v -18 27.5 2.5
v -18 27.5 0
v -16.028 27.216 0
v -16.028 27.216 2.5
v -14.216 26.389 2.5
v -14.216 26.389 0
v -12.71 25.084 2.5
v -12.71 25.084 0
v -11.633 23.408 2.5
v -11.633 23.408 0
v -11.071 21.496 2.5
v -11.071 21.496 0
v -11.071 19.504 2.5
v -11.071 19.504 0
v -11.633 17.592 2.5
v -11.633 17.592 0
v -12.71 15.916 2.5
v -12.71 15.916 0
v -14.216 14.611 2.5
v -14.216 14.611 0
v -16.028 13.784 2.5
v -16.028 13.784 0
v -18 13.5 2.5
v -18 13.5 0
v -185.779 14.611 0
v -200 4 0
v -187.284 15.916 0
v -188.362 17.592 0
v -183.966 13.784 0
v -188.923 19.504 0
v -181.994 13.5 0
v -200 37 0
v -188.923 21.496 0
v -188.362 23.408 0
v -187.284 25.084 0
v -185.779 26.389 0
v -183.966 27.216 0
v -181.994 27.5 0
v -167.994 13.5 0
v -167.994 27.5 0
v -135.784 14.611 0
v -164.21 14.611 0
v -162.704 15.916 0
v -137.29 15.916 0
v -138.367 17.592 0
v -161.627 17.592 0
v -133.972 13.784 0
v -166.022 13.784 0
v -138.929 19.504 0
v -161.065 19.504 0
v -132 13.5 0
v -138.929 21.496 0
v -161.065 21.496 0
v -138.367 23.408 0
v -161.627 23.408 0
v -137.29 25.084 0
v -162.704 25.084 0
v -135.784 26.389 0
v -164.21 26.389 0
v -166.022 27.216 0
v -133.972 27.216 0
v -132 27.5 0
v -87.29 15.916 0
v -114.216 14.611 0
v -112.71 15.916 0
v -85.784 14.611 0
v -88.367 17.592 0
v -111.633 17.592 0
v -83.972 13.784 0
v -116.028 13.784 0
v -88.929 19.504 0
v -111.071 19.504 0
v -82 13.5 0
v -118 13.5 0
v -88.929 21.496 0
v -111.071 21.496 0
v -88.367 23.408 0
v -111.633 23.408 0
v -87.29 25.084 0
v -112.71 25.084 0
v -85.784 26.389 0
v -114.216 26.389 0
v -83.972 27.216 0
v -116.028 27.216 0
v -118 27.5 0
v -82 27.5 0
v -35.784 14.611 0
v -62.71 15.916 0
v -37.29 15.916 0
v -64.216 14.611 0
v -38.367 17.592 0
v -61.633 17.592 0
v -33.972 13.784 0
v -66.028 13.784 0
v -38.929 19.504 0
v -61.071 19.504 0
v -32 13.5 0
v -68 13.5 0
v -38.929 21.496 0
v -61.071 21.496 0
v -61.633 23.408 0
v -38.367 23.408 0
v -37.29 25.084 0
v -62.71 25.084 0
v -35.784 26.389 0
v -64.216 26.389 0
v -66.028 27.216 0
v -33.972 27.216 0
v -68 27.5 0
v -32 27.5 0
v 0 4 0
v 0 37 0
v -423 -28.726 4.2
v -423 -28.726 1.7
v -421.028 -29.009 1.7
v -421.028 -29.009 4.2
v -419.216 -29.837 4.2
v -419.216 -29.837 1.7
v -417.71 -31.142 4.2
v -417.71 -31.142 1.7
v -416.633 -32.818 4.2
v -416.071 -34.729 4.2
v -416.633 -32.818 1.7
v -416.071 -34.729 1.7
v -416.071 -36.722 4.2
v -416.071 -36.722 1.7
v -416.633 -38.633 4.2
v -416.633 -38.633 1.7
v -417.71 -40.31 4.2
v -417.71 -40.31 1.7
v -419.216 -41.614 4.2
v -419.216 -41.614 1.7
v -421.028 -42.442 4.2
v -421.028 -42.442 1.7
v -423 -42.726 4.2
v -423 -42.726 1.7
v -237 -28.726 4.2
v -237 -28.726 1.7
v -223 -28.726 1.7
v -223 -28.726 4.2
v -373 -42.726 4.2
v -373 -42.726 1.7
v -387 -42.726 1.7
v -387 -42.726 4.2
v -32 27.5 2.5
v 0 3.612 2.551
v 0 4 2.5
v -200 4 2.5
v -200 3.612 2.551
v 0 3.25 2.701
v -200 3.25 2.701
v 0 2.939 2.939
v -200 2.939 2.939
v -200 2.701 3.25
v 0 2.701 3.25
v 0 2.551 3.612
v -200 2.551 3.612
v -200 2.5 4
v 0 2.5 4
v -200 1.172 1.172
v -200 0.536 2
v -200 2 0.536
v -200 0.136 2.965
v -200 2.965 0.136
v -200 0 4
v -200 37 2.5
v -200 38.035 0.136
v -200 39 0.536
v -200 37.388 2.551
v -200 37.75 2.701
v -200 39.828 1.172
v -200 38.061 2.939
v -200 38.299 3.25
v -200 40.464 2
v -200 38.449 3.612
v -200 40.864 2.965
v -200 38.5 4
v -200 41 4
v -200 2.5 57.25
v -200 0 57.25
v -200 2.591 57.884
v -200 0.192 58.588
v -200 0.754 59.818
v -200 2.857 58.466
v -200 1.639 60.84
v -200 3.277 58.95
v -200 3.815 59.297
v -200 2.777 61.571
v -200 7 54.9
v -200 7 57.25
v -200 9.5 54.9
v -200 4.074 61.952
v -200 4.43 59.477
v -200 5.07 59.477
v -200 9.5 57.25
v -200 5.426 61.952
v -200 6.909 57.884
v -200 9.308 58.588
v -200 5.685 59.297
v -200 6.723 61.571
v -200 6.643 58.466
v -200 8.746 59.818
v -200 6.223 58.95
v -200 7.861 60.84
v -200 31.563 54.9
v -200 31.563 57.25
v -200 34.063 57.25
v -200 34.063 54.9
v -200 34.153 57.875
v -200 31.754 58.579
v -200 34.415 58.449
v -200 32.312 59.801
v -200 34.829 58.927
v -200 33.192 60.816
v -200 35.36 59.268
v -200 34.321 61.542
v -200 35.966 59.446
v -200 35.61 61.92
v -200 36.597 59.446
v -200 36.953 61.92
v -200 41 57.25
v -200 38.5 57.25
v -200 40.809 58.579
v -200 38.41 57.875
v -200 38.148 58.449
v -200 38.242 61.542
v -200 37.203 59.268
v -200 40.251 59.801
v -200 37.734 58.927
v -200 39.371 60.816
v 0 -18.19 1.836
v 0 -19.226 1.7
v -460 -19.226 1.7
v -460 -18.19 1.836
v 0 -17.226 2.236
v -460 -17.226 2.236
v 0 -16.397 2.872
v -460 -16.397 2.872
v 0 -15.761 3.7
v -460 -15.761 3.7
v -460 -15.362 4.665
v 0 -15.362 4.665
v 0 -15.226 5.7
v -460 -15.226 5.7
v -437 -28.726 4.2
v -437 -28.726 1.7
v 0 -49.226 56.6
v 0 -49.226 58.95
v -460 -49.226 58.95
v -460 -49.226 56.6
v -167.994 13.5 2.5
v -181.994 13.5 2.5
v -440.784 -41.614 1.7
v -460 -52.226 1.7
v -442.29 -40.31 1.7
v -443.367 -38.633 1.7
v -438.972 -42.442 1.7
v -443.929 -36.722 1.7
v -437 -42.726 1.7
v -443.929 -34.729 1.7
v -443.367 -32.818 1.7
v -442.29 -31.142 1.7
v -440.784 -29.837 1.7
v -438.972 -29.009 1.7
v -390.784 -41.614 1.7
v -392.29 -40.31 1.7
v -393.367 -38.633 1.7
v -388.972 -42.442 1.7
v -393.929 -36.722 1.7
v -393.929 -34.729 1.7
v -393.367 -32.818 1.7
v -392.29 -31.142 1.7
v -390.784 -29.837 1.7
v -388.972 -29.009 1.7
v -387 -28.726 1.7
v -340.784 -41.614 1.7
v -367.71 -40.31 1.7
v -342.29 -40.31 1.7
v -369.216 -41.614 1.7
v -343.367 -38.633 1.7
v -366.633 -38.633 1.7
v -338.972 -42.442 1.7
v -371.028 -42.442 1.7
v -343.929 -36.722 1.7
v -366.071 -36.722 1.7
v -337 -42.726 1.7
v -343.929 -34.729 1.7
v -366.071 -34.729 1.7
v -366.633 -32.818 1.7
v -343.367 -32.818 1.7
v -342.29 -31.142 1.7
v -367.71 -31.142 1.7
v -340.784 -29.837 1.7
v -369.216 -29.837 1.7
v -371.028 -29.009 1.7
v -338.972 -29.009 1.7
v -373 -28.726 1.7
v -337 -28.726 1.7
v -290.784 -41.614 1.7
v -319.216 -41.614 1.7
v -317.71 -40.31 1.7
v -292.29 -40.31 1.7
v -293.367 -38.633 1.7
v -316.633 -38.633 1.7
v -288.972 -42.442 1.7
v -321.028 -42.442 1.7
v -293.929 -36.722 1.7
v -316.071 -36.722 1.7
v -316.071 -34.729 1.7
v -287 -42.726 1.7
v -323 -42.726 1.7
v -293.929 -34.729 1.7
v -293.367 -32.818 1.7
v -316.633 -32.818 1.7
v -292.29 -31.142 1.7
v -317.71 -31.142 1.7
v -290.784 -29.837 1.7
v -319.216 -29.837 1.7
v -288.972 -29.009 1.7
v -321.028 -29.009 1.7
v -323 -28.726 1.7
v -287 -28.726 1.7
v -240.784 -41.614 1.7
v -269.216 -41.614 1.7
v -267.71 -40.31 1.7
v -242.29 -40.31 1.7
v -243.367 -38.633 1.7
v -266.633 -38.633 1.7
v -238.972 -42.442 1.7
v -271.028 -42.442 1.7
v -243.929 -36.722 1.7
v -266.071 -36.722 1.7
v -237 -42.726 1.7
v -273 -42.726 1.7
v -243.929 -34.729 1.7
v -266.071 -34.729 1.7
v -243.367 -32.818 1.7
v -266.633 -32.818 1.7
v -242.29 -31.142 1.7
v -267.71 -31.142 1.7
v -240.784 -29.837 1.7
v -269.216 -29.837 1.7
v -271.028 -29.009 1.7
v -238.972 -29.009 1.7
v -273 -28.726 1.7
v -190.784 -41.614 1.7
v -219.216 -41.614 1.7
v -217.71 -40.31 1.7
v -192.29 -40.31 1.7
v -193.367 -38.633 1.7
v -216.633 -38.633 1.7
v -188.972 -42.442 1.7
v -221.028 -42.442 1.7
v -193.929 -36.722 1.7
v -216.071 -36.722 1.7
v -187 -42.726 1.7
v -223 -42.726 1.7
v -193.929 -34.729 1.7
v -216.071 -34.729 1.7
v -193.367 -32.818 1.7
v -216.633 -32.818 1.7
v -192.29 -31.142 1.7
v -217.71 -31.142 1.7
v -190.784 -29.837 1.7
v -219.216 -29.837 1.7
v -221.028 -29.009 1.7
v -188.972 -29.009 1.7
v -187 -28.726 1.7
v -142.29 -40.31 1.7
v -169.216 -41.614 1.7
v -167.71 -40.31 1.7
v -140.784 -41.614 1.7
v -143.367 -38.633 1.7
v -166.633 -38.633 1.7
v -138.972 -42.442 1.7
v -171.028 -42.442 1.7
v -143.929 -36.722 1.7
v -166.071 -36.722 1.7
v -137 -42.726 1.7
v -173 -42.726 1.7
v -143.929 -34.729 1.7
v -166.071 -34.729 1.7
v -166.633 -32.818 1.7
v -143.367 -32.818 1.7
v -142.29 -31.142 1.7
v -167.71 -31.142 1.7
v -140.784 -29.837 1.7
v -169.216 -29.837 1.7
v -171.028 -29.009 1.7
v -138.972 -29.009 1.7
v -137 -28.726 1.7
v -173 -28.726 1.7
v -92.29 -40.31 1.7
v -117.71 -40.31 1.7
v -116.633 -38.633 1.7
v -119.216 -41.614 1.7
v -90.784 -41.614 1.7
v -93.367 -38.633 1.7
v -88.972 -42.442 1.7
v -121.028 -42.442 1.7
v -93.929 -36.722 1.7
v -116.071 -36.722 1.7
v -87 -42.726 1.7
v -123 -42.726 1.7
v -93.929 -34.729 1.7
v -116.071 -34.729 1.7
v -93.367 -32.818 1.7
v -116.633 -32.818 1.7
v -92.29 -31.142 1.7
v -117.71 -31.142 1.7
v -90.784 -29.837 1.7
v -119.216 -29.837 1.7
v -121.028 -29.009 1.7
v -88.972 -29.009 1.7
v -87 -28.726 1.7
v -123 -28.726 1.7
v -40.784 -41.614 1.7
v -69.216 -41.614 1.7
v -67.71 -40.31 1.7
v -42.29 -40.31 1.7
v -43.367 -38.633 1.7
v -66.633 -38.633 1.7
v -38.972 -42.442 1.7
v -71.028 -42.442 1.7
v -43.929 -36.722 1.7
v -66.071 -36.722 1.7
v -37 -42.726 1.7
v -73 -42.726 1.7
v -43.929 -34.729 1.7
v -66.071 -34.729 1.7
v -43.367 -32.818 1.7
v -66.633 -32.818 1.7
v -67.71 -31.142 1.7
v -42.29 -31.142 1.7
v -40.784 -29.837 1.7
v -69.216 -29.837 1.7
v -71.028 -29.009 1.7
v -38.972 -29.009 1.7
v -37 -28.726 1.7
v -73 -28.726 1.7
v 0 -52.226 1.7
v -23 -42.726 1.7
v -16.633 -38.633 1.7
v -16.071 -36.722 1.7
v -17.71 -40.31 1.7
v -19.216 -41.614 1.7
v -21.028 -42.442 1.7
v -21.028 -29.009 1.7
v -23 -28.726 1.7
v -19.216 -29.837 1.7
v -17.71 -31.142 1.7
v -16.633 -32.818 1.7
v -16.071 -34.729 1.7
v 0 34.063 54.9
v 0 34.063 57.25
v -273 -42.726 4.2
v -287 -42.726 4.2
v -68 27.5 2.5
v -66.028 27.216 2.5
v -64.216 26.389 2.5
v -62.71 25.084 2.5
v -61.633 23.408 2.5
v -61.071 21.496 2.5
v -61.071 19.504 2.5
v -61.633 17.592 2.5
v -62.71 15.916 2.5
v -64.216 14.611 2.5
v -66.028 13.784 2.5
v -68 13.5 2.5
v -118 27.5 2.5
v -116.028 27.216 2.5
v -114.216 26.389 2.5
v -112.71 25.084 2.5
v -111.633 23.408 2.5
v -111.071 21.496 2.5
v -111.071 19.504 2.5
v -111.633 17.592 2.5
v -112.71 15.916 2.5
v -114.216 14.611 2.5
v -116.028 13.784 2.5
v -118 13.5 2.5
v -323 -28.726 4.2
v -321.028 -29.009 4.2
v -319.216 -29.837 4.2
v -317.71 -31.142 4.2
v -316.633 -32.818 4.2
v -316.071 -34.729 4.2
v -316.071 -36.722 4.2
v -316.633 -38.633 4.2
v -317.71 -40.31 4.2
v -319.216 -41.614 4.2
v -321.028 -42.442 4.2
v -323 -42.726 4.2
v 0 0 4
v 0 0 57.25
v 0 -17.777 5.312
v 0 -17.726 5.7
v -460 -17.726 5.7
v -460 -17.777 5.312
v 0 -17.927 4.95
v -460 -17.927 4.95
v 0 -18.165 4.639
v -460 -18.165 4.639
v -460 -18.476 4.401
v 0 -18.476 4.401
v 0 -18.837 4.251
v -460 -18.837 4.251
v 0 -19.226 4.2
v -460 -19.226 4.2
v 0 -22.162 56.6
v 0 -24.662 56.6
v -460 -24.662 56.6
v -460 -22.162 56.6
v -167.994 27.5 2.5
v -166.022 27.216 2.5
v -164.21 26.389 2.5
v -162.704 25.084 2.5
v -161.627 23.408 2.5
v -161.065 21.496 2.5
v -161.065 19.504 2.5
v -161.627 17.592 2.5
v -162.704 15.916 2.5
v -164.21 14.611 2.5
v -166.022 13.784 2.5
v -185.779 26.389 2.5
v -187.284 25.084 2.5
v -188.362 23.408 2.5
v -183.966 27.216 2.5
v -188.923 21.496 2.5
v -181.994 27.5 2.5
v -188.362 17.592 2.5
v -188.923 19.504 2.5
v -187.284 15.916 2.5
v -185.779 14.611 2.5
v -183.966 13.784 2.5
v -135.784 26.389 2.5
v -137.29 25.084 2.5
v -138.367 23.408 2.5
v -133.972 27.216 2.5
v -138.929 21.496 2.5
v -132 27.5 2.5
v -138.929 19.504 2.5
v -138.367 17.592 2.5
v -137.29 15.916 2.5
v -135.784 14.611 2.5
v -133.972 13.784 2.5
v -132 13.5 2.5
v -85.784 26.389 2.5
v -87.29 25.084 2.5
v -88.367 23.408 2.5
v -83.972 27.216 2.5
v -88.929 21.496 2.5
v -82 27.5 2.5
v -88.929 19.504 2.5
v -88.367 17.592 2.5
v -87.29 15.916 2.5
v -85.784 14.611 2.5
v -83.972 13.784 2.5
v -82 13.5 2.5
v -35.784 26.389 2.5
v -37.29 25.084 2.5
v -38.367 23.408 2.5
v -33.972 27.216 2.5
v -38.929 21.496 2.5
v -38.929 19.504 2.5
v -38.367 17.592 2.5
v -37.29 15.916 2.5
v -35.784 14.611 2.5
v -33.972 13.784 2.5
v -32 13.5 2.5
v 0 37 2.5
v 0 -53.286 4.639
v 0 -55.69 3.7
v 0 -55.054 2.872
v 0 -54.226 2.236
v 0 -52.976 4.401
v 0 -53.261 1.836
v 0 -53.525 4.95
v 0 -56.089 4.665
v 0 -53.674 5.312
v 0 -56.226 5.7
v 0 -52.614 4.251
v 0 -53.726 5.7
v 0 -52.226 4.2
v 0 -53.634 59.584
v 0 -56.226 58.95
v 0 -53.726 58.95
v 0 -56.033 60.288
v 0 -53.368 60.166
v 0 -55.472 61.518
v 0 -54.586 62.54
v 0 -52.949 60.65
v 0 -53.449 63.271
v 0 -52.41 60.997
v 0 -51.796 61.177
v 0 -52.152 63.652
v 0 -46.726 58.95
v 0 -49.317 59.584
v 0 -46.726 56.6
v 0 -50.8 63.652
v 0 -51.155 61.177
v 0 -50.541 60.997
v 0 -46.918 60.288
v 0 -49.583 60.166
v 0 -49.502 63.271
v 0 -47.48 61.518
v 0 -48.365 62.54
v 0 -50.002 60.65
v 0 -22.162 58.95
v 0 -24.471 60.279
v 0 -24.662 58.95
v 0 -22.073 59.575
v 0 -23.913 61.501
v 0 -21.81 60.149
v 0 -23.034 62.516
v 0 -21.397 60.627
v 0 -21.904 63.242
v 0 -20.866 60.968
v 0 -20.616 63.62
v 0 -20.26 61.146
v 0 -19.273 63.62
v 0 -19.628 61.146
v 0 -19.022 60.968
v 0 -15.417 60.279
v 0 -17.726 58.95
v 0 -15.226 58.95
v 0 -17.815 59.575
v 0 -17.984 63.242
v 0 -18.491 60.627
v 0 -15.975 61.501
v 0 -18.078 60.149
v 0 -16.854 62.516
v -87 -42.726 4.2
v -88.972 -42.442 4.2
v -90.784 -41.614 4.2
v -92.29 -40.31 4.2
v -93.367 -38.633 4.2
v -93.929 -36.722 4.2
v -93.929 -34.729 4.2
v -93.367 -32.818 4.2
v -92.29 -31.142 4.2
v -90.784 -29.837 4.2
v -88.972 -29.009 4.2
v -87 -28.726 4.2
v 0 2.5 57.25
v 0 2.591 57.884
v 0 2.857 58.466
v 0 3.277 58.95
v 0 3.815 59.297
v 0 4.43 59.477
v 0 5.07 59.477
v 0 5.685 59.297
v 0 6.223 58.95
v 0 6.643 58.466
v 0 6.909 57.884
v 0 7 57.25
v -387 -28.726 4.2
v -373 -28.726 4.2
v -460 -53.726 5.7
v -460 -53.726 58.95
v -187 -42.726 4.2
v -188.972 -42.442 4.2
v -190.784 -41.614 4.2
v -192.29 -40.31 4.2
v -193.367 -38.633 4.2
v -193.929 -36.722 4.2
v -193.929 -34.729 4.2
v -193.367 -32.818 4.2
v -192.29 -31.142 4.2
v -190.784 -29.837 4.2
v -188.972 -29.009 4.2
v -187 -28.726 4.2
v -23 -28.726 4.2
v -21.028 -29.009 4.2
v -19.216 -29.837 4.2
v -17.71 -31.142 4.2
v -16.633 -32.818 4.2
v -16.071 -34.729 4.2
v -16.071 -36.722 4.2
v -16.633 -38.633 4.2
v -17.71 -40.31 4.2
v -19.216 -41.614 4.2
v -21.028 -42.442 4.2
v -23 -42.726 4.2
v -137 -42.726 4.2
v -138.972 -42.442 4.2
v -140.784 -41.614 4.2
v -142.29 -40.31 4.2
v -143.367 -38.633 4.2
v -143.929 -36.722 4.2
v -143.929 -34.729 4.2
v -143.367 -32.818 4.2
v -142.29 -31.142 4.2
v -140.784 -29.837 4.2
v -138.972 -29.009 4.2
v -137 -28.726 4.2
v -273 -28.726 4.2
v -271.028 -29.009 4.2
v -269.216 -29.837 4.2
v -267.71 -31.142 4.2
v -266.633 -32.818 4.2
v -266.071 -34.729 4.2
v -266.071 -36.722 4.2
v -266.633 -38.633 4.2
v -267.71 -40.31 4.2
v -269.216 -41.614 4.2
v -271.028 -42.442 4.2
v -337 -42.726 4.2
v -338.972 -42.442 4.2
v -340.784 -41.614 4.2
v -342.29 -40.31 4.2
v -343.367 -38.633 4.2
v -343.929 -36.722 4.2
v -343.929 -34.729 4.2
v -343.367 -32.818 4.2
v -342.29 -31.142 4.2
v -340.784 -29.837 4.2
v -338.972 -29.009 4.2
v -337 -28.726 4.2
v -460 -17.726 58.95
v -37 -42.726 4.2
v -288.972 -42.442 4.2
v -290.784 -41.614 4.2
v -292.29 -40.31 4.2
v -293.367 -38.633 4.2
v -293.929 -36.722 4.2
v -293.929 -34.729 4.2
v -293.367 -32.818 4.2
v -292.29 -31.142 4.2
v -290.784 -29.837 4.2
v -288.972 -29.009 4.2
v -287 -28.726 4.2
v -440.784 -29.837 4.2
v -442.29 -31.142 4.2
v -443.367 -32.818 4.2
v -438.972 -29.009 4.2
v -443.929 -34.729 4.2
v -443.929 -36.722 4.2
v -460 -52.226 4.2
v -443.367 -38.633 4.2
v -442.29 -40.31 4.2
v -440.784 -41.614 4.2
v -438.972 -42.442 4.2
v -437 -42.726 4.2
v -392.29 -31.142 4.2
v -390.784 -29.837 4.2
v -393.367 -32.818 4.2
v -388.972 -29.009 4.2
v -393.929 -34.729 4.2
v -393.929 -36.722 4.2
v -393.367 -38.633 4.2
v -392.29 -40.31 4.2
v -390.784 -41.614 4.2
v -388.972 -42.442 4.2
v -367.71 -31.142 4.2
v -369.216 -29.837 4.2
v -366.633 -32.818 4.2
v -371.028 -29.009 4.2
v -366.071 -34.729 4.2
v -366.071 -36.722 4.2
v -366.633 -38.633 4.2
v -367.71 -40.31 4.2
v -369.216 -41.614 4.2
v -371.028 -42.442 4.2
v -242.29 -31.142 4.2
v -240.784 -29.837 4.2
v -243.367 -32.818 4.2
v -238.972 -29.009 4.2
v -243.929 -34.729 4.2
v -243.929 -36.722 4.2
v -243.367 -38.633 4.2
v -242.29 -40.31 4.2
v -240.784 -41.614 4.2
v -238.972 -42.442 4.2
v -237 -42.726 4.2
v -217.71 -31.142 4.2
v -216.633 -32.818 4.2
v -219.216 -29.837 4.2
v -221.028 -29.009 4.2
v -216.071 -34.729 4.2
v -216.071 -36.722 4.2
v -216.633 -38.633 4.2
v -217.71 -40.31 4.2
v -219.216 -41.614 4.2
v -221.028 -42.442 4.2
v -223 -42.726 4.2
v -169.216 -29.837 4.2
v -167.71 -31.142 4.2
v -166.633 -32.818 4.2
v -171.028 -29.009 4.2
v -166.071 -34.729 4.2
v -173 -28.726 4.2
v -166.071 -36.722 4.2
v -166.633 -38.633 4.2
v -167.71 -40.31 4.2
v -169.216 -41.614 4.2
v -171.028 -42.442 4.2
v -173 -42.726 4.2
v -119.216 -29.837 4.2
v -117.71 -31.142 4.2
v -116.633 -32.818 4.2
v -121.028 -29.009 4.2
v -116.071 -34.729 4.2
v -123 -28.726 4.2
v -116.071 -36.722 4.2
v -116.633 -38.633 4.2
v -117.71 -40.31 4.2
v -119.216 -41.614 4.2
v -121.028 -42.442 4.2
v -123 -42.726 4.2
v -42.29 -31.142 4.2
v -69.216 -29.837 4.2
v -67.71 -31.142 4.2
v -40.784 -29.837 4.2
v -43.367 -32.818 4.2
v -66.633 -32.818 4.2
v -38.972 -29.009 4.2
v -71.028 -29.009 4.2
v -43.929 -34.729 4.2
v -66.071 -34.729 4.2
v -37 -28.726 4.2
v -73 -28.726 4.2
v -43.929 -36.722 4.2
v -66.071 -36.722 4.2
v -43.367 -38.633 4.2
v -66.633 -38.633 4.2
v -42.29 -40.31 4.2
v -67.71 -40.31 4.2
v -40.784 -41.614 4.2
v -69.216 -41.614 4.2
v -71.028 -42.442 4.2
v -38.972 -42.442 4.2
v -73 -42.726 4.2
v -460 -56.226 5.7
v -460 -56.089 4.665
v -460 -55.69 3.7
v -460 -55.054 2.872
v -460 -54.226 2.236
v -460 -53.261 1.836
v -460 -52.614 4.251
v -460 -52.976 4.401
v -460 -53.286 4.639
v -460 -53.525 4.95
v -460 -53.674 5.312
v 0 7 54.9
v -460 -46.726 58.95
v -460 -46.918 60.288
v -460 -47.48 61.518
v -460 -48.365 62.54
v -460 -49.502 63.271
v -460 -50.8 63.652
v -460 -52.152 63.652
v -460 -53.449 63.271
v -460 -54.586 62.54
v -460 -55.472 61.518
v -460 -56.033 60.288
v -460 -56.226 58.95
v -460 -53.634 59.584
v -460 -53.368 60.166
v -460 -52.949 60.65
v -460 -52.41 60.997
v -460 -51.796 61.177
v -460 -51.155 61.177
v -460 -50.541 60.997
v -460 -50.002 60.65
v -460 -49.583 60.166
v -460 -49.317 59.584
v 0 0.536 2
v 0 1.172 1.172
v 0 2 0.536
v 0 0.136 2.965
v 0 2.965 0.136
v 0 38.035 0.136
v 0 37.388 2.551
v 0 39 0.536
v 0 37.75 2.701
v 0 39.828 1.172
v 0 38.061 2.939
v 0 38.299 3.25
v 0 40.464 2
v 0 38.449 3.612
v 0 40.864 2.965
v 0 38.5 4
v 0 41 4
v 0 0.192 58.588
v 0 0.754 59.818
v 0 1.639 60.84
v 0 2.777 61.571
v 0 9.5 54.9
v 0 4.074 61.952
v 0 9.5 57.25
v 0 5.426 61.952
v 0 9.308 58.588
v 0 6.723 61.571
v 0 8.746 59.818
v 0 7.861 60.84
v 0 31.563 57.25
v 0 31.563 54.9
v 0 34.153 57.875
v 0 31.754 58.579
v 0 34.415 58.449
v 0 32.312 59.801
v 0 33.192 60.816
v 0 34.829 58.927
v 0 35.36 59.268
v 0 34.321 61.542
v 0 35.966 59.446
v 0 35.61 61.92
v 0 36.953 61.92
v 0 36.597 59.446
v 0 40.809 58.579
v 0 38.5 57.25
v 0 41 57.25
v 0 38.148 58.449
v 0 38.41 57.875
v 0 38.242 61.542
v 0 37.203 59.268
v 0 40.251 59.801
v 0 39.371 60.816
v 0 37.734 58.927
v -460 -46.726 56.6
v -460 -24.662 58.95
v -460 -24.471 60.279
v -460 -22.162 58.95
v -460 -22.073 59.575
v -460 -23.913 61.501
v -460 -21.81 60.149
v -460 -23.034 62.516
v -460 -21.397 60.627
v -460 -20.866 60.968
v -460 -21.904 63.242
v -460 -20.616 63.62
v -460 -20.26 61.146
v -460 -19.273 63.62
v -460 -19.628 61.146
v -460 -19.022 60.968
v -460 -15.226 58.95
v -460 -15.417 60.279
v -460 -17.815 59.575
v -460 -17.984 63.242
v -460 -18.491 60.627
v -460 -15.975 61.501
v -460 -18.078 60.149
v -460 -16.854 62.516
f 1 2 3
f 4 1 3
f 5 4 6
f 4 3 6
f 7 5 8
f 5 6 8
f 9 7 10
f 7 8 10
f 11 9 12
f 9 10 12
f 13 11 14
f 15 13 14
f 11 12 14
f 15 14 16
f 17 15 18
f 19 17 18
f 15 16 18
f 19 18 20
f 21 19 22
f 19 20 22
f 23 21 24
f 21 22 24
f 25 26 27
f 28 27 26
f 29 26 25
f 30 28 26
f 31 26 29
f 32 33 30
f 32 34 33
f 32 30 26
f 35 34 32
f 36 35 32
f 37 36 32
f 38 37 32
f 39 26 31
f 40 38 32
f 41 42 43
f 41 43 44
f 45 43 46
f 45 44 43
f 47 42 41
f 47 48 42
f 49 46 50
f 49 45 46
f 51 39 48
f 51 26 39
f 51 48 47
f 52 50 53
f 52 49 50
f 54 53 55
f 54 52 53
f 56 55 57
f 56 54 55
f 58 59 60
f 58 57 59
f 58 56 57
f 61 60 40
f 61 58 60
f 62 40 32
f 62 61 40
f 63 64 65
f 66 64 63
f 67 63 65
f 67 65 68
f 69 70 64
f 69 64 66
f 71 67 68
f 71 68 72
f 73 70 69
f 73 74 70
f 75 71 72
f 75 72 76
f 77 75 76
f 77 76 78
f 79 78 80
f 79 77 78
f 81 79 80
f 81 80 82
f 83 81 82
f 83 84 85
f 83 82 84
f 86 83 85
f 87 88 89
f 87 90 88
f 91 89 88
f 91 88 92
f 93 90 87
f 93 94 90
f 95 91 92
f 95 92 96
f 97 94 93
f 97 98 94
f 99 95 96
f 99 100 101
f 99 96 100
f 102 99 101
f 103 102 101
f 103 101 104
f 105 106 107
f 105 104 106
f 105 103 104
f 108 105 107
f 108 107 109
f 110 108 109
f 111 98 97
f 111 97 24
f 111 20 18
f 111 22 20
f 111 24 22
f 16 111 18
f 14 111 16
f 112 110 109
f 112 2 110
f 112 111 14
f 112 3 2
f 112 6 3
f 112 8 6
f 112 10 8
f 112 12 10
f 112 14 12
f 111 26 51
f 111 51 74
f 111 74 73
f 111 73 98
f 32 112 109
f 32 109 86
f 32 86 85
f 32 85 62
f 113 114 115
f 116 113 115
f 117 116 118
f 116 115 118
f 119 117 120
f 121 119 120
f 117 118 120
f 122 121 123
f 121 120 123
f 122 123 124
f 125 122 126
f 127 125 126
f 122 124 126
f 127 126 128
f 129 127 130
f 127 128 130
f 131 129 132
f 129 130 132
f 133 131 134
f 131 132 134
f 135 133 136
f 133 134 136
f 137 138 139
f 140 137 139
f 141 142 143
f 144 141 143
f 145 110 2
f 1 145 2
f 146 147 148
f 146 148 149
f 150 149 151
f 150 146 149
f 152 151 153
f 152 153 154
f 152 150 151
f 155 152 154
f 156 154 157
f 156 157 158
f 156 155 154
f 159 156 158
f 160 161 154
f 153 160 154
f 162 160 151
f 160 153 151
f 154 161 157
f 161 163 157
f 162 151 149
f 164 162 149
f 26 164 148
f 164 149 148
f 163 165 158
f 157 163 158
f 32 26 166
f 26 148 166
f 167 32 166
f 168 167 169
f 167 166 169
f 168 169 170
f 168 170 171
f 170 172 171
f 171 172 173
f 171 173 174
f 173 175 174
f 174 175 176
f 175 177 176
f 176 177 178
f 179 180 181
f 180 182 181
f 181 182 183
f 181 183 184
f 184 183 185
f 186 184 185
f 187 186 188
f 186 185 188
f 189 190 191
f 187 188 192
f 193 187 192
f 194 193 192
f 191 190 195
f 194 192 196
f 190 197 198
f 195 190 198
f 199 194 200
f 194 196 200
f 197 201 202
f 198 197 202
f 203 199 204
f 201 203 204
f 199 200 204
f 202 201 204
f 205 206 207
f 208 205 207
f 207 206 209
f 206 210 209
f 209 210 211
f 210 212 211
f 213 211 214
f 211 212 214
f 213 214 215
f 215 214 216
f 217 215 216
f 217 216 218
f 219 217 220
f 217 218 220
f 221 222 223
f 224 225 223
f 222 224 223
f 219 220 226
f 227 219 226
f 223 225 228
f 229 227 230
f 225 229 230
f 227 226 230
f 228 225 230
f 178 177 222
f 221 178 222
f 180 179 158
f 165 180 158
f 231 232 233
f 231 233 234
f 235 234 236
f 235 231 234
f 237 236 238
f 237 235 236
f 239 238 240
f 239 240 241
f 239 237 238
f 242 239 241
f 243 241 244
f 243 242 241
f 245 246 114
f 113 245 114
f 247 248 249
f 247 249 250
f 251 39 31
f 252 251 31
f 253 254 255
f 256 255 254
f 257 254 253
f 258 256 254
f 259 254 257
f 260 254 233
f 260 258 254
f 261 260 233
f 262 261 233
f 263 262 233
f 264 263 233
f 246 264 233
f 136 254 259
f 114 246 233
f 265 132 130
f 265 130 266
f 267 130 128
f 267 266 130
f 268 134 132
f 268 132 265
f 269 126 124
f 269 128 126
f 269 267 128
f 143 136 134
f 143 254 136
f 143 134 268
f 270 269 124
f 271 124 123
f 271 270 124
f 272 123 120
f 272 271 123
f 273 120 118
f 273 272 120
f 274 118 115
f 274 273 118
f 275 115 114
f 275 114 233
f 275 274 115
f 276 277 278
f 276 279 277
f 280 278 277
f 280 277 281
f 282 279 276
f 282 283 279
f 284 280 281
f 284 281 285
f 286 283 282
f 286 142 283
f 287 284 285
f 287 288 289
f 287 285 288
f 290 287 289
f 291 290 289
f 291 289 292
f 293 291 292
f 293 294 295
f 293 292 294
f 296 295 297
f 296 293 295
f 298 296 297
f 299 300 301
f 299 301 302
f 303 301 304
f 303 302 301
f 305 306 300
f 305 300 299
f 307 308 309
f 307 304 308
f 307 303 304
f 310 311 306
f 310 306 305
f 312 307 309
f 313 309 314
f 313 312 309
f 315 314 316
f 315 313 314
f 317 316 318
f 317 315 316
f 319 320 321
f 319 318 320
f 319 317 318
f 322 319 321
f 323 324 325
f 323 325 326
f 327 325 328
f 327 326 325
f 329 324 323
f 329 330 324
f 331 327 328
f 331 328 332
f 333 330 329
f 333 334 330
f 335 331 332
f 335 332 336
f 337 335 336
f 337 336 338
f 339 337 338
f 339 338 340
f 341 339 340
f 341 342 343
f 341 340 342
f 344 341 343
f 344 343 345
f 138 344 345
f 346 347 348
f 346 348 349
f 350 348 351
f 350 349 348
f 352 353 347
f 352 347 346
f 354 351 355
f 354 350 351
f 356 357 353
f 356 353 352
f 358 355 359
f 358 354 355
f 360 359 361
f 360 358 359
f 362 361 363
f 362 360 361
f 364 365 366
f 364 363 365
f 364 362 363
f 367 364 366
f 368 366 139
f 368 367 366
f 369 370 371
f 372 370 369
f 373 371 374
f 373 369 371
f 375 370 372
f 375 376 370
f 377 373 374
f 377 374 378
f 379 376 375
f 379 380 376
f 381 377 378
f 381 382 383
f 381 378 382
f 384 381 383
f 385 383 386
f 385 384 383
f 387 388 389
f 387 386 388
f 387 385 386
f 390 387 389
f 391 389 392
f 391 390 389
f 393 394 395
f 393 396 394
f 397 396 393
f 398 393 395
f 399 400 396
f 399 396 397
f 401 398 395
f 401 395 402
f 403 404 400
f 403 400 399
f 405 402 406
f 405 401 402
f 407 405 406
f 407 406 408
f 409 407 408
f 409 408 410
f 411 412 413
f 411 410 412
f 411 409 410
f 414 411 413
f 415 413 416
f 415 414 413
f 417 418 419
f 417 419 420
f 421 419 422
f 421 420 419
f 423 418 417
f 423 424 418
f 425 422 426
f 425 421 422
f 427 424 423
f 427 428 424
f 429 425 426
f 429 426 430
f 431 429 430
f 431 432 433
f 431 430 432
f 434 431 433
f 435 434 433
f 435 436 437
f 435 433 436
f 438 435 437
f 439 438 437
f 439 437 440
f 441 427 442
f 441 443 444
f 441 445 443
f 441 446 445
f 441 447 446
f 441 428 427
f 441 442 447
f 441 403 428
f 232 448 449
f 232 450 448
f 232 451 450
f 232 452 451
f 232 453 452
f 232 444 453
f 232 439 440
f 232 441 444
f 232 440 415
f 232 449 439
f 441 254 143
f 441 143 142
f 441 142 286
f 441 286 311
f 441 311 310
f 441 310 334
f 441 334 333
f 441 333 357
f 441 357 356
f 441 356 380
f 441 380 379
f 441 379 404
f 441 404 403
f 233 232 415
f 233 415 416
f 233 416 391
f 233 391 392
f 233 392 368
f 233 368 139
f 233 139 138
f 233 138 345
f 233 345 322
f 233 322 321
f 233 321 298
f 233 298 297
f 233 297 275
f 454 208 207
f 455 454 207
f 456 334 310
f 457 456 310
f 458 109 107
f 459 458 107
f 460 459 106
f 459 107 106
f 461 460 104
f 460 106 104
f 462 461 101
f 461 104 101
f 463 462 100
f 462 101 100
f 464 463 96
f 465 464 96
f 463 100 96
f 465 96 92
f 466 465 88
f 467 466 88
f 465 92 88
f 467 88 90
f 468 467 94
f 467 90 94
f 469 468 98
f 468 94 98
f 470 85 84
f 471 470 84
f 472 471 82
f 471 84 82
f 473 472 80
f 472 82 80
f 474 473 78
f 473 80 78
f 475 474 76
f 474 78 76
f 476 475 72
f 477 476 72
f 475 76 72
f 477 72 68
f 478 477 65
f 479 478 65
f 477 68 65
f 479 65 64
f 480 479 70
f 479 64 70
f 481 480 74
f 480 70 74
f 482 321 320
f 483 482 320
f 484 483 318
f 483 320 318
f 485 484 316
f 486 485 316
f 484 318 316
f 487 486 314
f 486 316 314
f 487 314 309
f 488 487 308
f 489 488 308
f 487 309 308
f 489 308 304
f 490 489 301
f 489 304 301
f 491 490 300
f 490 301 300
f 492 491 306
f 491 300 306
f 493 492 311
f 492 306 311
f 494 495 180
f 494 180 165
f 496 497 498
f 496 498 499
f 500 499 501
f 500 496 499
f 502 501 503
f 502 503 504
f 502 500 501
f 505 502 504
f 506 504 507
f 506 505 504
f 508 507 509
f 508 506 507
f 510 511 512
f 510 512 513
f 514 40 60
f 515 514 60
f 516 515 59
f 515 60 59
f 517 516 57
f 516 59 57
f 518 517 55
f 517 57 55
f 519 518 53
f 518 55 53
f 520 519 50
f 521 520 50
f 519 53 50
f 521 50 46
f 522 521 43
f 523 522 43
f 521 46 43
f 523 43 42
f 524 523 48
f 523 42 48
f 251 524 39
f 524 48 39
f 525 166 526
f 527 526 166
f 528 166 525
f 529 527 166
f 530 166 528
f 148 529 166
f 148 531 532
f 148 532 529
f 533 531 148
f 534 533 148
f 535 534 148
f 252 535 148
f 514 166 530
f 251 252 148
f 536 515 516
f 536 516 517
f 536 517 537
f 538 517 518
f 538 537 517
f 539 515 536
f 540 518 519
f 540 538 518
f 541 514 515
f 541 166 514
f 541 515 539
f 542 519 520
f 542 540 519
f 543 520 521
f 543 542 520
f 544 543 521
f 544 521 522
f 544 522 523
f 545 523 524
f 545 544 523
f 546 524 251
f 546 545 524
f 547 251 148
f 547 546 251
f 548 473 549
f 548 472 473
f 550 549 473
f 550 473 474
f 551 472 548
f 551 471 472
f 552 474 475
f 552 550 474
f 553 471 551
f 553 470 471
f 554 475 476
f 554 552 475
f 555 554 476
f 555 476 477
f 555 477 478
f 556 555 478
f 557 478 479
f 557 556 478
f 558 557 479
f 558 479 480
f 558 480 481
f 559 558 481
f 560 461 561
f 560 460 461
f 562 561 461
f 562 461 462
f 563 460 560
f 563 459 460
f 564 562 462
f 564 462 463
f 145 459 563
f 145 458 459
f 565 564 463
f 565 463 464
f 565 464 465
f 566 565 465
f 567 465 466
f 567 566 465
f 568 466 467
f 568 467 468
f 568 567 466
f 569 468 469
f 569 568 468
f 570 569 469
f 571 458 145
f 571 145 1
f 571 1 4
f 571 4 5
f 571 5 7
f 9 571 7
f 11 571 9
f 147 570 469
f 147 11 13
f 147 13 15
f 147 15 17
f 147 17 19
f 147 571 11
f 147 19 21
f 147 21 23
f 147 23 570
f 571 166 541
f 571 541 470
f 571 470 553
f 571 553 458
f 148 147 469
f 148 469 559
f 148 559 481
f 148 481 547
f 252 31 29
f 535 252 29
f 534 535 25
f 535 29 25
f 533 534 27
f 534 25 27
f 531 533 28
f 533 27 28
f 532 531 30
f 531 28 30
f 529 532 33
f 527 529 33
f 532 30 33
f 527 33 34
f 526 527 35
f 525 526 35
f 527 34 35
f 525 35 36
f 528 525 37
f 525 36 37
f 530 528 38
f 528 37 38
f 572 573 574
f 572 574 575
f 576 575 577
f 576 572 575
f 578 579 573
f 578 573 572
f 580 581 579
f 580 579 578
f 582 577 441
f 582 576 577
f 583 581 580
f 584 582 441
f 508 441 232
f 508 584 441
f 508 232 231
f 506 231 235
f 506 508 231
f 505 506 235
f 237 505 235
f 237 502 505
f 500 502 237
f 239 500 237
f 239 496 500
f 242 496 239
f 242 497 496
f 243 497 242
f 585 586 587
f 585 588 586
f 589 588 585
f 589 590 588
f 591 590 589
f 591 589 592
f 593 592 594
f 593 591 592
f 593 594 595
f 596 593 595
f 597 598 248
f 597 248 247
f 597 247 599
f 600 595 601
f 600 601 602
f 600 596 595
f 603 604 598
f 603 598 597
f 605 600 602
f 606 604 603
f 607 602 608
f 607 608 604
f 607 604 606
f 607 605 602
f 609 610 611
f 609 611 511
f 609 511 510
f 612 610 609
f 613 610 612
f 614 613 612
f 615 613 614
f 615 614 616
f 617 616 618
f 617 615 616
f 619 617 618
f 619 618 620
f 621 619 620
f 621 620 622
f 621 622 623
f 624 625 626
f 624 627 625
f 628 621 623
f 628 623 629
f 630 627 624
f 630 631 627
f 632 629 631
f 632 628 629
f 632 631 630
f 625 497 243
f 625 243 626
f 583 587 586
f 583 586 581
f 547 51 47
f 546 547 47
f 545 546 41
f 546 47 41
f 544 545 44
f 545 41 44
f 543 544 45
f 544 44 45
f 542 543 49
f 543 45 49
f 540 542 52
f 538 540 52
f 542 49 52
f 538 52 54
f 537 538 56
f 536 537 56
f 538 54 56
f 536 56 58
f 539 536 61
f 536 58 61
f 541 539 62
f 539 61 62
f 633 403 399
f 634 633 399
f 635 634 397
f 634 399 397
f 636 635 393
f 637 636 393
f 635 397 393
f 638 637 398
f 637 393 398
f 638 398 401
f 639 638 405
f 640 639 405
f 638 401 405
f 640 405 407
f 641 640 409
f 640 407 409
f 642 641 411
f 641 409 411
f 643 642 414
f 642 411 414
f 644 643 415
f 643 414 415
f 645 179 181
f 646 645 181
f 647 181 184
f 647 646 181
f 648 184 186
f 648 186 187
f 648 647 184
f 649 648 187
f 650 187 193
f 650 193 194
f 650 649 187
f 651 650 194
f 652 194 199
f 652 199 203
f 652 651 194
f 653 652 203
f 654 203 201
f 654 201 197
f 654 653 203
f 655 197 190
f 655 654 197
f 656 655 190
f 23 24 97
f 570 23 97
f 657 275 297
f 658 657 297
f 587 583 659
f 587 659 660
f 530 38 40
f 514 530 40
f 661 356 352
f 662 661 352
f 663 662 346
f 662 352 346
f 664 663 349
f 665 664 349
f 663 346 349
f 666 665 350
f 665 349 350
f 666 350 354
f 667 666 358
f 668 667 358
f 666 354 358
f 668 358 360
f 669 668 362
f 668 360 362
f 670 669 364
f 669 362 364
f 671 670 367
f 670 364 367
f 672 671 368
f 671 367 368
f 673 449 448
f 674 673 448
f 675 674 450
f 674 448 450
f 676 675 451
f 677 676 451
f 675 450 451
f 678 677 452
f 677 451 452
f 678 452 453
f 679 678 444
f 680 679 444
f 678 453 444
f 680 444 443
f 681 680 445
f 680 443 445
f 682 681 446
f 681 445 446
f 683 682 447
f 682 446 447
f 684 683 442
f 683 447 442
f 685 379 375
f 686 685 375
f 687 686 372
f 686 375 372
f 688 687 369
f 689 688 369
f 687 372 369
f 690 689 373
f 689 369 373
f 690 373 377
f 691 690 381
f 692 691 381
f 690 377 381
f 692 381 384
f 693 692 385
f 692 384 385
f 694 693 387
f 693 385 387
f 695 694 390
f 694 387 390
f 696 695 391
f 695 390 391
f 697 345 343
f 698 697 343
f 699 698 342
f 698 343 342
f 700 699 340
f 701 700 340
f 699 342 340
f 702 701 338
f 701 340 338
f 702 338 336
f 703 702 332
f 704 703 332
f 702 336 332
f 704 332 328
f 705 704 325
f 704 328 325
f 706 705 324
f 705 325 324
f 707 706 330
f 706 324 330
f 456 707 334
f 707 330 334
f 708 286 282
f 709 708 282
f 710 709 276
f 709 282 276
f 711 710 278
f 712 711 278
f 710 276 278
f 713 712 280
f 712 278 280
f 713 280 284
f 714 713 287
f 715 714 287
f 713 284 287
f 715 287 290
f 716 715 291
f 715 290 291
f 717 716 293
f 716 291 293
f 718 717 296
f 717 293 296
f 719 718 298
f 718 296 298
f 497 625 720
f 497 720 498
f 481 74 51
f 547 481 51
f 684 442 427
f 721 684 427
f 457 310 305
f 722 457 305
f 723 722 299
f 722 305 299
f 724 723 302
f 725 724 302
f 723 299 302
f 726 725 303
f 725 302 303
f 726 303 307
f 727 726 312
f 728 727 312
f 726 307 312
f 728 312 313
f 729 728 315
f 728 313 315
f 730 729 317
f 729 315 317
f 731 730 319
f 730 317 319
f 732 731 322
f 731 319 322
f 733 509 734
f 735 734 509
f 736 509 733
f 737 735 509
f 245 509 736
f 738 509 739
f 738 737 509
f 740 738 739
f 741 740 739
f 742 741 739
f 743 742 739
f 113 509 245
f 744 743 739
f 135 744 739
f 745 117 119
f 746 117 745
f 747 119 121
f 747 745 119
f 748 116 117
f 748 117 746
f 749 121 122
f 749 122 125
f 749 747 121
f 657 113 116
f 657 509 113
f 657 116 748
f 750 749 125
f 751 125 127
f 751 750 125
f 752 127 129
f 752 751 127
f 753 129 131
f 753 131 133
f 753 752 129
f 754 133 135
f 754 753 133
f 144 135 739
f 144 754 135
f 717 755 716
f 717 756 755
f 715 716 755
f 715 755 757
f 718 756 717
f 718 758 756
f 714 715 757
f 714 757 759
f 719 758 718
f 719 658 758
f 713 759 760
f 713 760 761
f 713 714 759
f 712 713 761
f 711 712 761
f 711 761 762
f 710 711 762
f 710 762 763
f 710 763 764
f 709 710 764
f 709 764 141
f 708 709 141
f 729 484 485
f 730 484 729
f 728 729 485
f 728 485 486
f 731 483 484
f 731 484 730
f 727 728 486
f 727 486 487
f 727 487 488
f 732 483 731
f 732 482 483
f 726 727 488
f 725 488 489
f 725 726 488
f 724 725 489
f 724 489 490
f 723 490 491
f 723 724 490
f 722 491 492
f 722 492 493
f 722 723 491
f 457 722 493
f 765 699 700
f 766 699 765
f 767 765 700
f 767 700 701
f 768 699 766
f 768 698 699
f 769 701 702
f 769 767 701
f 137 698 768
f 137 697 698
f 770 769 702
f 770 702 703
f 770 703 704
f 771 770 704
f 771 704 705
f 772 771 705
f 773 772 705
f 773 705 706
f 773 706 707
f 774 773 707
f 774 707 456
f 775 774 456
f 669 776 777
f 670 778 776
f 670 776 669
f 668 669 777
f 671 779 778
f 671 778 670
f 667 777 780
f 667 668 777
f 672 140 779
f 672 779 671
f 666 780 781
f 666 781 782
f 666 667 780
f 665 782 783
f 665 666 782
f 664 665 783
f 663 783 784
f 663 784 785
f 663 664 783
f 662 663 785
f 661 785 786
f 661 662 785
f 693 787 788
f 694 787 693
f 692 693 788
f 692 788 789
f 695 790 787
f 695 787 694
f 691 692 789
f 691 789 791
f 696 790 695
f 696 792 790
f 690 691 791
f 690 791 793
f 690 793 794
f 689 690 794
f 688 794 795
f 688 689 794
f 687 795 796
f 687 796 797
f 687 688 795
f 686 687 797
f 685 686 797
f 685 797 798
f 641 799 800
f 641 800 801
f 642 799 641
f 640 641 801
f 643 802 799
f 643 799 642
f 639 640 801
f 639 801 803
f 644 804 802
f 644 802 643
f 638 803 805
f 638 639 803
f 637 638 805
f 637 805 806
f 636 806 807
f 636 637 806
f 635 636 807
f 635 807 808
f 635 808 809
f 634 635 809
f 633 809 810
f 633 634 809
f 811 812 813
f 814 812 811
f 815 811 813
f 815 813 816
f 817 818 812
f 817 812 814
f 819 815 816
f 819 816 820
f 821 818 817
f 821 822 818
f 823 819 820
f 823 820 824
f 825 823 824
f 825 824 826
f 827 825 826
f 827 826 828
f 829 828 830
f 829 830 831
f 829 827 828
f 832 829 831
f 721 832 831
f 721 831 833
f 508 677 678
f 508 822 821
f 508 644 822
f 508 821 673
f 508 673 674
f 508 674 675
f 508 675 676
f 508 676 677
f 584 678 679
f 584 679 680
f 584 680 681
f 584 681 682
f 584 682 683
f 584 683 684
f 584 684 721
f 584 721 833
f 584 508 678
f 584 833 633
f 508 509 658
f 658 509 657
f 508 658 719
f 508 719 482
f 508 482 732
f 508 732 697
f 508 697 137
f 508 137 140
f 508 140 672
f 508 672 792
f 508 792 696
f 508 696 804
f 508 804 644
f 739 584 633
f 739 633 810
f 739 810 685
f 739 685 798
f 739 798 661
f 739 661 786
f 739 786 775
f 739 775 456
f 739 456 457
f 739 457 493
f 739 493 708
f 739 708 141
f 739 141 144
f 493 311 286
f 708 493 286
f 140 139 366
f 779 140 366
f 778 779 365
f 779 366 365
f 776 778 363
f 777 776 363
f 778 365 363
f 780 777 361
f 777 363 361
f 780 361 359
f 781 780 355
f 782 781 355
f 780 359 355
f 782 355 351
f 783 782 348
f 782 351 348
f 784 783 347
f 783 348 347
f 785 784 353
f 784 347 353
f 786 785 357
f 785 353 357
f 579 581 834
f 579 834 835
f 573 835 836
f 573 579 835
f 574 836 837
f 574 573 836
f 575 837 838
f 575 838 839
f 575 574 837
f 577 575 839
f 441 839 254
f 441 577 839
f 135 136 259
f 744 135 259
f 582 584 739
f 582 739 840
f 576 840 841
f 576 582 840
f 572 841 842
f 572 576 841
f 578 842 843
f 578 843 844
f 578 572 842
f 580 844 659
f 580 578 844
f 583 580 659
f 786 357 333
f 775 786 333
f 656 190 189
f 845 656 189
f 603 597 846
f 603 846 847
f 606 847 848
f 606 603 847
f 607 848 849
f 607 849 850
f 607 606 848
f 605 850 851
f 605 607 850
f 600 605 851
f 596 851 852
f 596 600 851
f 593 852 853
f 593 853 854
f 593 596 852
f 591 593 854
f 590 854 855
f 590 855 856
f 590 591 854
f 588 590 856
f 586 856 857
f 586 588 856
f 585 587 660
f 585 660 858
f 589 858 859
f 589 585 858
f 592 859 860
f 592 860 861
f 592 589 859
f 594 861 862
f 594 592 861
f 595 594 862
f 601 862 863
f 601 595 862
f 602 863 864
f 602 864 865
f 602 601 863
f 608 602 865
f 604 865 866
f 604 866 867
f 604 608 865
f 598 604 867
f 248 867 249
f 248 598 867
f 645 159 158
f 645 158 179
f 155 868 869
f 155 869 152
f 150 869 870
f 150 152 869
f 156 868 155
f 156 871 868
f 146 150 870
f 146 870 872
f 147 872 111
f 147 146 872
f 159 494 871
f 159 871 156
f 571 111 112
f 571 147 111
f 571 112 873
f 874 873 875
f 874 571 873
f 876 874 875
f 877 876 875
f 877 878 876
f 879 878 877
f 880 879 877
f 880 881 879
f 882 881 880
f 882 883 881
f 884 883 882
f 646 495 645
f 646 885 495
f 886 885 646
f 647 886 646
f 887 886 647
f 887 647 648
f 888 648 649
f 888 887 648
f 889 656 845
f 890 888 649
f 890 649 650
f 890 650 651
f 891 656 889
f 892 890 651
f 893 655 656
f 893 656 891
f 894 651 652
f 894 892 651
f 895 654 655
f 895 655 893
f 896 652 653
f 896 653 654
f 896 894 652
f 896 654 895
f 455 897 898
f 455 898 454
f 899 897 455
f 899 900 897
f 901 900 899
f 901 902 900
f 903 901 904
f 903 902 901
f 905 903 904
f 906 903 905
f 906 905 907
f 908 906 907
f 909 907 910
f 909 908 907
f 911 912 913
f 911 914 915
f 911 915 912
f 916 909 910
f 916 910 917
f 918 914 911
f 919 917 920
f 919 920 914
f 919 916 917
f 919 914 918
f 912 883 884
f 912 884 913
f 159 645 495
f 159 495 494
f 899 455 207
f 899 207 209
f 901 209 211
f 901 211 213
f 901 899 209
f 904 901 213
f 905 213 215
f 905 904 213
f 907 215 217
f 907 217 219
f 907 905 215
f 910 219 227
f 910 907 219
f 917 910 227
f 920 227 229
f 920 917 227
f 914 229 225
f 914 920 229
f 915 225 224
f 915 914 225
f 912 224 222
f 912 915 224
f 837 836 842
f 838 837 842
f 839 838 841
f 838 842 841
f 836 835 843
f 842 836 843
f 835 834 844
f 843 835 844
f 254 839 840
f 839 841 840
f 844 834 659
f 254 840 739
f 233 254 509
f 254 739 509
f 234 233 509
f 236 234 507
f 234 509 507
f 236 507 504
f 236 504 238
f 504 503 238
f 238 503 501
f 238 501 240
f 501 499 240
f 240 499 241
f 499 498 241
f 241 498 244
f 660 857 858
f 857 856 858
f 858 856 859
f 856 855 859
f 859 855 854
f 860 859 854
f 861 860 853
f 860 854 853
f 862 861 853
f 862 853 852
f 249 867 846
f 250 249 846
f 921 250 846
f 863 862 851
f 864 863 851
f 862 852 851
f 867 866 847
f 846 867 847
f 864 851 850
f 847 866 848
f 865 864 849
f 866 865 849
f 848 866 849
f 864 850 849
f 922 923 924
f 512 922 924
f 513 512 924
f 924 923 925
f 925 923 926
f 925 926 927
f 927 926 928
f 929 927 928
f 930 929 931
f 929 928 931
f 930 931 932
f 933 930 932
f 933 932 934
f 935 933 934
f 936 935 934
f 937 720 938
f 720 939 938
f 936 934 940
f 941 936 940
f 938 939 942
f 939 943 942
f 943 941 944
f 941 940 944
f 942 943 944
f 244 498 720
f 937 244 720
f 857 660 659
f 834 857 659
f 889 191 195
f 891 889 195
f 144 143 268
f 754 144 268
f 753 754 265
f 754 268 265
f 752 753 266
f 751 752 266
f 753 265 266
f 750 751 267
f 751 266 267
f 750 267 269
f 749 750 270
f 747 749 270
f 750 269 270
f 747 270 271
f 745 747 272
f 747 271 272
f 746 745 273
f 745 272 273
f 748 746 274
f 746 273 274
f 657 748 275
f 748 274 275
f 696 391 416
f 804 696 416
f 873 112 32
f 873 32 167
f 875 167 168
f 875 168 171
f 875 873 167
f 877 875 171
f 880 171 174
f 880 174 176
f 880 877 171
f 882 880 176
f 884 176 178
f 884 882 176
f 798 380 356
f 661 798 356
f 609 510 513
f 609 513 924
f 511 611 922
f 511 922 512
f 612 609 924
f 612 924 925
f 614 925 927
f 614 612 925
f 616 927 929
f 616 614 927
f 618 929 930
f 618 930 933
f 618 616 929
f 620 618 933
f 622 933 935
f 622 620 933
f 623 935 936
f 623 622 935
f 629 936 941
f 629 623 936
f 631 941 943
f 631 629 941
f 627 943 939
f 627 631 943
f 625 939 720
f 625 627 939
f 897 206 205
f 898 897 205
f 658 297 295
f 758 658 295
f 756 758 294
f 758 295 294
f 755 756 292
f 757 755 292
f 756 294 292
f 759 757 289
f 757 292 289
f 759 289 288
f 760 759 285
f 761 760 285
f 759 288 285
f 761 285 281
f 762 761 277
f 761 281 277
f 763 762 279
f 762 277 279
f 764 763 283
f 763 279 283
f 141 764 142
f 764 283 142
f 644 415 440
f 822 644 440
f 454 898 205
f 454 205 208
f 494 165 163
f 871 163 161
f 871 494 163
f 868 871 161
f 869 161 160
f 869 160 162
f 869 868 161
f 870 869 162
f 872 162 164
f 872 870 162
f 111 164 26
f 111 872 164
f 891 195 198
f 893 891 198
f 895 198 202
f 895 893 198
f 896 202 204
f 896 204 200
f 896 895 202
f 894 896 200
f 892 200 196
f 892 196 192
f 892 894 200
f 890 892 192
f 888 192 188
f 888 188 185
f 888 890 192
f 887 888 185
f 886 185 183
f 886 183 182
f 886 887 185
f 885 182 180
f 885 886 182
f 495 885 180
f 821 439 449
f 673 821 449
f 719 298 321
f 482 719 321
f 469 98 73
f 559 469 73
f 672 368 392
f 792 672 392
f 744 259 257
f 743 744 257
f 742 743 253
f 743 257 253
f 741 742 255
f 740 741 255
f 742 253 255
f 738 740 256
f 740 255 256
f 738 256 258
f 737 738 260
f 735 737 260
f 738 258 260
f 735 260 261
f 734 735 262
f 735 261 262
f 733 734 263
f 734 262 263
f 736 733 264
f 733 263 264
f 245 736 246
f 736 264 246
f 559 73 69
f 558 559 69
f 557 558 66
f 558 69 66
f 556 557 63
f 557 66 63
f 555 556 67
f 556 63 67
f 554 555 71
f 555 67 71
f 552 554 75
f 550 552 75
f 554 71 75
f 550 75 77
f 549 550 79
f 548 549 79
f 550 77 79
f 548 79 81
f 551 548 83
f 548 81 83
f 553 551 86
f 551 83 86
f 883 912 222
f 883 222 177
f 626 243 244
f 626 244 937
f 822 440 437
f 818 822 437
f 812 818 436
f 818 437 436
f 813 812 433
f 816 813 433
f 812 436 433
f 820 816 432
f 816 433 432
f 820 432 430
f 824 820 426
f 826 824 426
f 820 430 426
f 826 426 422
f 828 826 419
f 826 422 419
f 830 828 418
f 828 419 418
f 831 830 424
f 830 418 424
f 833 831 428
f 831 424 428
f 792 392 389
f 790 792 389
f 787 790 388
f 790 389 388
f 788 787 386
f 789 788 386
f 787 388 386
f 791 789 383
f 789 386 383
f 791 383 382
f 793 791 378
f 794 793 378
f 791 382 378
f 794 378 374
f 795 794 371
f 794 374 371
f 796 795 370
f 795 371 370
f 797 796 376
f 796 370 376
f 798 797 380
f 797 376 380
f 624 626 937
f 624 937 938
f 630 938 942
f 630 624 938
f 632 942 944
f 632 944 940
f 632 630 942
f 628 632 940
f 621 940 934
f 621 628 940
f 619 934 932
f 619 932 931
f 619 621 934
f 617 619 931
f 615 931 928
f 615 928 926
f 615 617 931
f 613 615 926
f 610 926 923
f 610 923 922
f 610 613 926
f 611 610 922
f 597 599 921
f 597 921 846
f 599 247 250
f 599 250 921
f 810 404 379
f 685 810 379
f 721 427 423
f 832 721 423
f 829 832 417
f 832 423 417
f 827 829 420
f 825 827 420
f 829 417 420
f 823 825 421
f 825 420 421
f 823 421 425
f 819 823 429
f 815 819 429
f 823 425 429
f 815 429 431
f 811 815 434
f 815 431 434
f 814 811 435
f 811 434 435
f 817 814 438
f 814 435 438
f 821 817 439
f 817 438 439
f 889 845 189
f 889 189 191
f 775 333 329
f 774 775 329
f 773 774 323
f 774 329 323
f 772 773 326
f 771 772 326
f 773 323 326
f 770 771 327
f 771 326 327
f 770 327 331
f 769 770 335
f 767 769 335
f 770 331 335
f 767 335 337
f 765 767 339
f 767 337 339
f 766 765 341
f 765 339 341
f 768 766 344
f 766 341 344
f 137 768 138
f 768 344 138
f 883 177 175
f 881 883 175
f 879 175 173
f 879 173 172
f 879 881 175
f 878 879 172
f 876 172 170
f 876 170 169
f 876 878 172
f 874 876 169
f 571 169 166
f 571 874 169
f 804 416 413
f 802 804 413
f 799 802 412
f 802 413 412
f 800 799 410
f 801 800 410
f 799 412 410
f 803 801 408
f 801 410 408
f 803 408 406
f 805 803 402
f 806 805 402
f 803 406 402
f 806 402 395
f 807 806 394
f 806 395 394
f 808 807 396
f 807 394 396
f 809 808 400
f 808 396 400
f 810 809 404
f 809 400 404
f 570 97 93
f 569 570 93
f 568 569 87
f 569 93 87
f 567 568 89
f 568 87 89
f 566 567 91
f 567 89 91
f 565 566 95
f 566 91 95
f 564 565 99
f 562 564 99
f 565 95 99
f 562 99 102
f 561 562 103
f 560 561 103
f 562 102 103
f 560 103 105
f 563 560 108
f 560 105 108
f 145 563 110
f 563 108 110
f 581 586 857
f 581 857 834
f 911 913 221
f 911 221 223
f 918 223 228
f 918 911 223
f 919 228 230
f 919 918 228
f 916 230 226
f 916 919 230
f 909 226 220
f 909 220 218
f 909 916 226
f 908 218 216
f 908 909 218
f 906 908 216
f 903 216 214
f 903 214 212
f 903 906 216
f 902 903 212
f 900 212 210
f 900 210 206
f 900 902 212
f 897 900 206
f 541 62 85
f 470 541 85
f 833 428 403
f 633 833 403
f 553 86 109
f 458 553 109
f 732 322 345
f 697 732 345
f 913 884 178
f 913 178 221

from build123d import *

# Parameters (mm, degrees)
F1_DEPTH = 200
F3_DEPTH = 25
F5_DEPTH = 460
F7_DEPTH = 25


with BuildPart() as f1:
    # F0 (on Right) → F1 (new body)
    with BuildSketch(Plane.YZ):
        with BuildLine():
            Line((0, 57.25), (0, 4))
            ThreePointArc((0, 4), (1.171573, 1.171573), (4, 0))
            Line((4, 0), (37, 0))
            ThreePointArc((37, 0), (39.828427, 1.171573), (41, 4))
            Line((41, 4), (41, 57.25))
            ThreePointArc((41, 57.25), (36.281579, 61.968421), (31.563158, 57.25))
            Line((31.563158, 57.25), (31.563158, 54.9))
            Line((31.563158, 54.9), (34.063158, 54.9))
            Line((34.063158, 54.9), (34.063158, 57.25))
            ThreePointArc((34.063158, 57.25), (36.281579, 59.468421), (38.5, 57.25))
            Line((38.5, 57.25), (38.5, 4))
            ThreePointArc((38.5, 4), (38.06066, 2.93934), (37, 2.5))
            Line((37, 2.5), (4, 2.5))
            ThreePointArc((4, 2.5), (2.93934, 2.93934), (2.5, 4))
            Line((2.5, 4), (2.5, 57.25))
            ThreePointArc((2.5, 57.25), (4.75, 59.5), (7, 57.25))
            Line((7, 57.25), (7, 54.9))
            Line((7, 54.9), (9.5, 54.9))
            Line((9.5, 54.9), (9.5, 57.25))
            ThreePointArc((9.5, 57.25), (4.75, 62), (0, 57.25))
        make_face()
    extrude(amount=-F1_DEPTH)

    # F2 (on face) → F3 (cut)
    with BuildSketch(Plane(origin=(0, 0, 0), x_dir=(1, 0, 0), z_dir=(0, 0, -1))):
        with BuildLine():
            ThreePointArc((-118, -27.5), (-111, -20.5), (-118, -13.5))
            Line((-118, -13.5), (-132, -13.5))
            ThreePointArc((-132, -13.5), (-139, -20.5), (-132, -27.5))
            Line((-132, -27.5), (-118, -27.5))
        make_face()
        with BuildLine():
            Line((-82, -27.5), (-68, -27.5))
            ThreePointArc((-68, -27.5), (-61, -20.5), (-68, -13.5))
            Line((-68, -13.5), (-82, -13.5))
            ThreePointArc((-82, -13.5), (-89, -20.5), (-82, -27.5))
        make_face()
        with BuildLine():
            Line((-32, -27.5), (-18, -27.5))
            ThreePointArc((-18, -27.5), (-11, -20.5), (-18, -13.5))
            Line((-18, -13.5), (-32, -13.5))
            ThreePointArc((-32, -13.5), (-39, -20.5), (-32, -27.5))
        make_face()
        with BuildLine():
            Line((-181.994144, -27.5), (-167.994144, -27.5))
            ThreePointArc((-167.994144, -27.5), (-160.994144, -20.5), (-167.994144, -13.5))
            Line((-167.994144, -13.5), (-181.994144, -13.5))
            ThreePointArc((-181.994144, -13.5), (-188.994144, -20.5), (-181.994144, -27.5))
        make_face()
    extrude(amount=-F3_DEPTH, mode=Mode.SUBTRACT)


with BuildPart() as f5:
    # F4 (on Right) → F5 (new body)
    with BuildSketch(Plane.YZ):
        with BuildLine():
            Line((-56.22559, 58.95), (-56.22559, 5.7))
            ThreePointArc((-56.22559, 5.7), (-55.054018, 2.871573), (-52.22559, 1.7))
            Line((-52.22559, 1.7), (-19.22559, 1.7))
            ThreePointArc((-19.22559, 1.7), (-16.397163, 2.871573), (-15.22559, 5.7))
            Line((-15.22559, 5.7), (-15.22559, 58.95))
            ThreePointArc((-15.22559, 58.95), (-19.944011, 63.668421), (-24.662433, 58.95))
            Line((-24.662433, 58.95), (-24.662433, 56.6))
            Line((-24.662433, 56.6), (-22.162433, 56.6))
            Line((-22.162433, 56.6), (-22.162433, 58.95))
            ThreePointArc((-22.162433, 58.95), (-19.944011, 61.168421), (-17.72559, 58.95))
            Line((-17.72559, 58.95), (-17.72559, 5.7))
            ThreePointArc((-17.72559, 5.7), (-18.16493, 4.63934), (-19.22559, 4.2))
            Line((-19.22559, 4.2), (-52.22559, 4.2))
            ThreePointArc((-52.22559, 4.2), (-53.286251, 4.63934), (-53.72559, 5.7))
            Line((-53.72559, 5.7), (-53.72559, 58.95))
            ThreePointArc((-53.72559, 58.95), (-51.47559, 61.2), (-49.22559, 58.95))
            Line((-49.22559, 58.95), (-49.22559, 56.6))
            Line((-49.22559, 56.6), (-46.72559, 56.6))
            Line((-46.72559, 56.6), (-46.72559, 58.95))
            ThreePointArc((-46.72559, 58.95), (-51.47559, 63.7), (-56.22559, 58.95))
        make_face()
    extrude(amount=-F5_DEPTH)

    # F6 (on face) → F7 (cut)
    with BuildSketch(Plane(origin=(0, 0, 1.7), x_dir=(1, 0, 0), z_dir=(0, 0, -1))):
        with BuildLine():
            Line((-37, 28.72559), (-23, 28.72559))
            ThreePointArc((-23, 28.72559), (-16, 35.72559), (-23, 42.72559))
            Line((-23, 42.72559), (-37, 42.72559))
            ThreePointArc((-37, 42.72559), (-44, 35.72559), (-37, 28.72559))
        make_face()
        with BuildLine():
            Line((-73, 42.72559), (-87, 42.72559))
            ThreePointArc((-87, 42.72559), (-94, 35.72559), (-87, 28.72559))
            Line((-87, 28.72559), (-73, 28.72559))
            ThreePointArc((-73, 28.72559), (-66, 35.72559), (-73, 42.72559))
        make_face()
        with BuildLine():
            Line((-123, 42.72559), (-137, 42.72559))
            ThreePointArc((-137, 42.72559), (-144, 35.72559), (-137, 28.72559))
            Line((-137, 28.72559), (-123, 28.72559))
            ThreePointArc((-123, 28.72559), (-116, 35.72559), (-123, 42.72559))
        make_face()
        with BuildLine():
            Line((-173, 42.72559), (-187, 42.72559))
            ThreePointArc((-187, 42.72559), (-194, 35.72559), (-187, 28.72559))
            Line((-187, 28.72559), (-173, 28.72559))
            ThreePointArc((-173, 28.72559), (-166, 35.72559), (-173, 42.72559))
        make_face()
        with BuildLine():
            Line((-223, 42.72559), (-237, 42.72559))
            ThreePointArc((-237, 42.72559), (-244, 35.72559), (-237, 28.72559))
            Line((-237, 28.72559), (-223, 28.72559))
            ThreePointArc((-223, 28.72559), (-216, 35.72559), (-223, 42.72559))
        make_face()
        with BuildLine():
            Line((-273, 42.72559), (-287, 42.72559))
            ThreePointArc((-287, 42.72559), (-294, 35.72559), (-287, 28.72559))
            Line((-287, 28.72559), (-273, 28.72559))
            ThreePointArc((-273, 28.72559), (-266, 35.72559), (-273, 42.72559))
        make_face()
        with BuildLine():
            Line((-323, 42.72559), (-337, 42.72559))
            ThreePointArc((-337, 42.72559), (-344, 35.72559), (-337, 28.72559))
            Line((-337, 28.72559), (-323, 28.72559))
            ThreePointArc((-323, 28.72559), (-316, 35.72559), (-323, 42.72559))
        make_face()
        with BuildLine():
            Line((-373, 42.72559), (-387, 42.72559))
            ThreePointArc((-387, 42.72559), (-394, 35.72559), (-387, 28.72559))
            Line((-387, 28.72559), (-373, 28.72559))
            ThreePointArc((-373, 28.72559), (-366, 35.72559), (-373, 42.72559))
        make_face()
        with BuildLine():
            Line((-423, 42.72559), (-437, 42.72559))
            ThreePointArc((-437, 42.72559), (-444, 35.72559), (-437, 28.72559))
            Line((-437, 28.72559), (-423, 28.72559))
            ThreePointArc((-423, 28.72559), (-416, 35.72559), (-423, 42.72559))
        make_face()
    extrude(amount=-F7_DEPTH, mode=Mode.SUBTRACT)


solid = Compound([f1.part, f5.part])
